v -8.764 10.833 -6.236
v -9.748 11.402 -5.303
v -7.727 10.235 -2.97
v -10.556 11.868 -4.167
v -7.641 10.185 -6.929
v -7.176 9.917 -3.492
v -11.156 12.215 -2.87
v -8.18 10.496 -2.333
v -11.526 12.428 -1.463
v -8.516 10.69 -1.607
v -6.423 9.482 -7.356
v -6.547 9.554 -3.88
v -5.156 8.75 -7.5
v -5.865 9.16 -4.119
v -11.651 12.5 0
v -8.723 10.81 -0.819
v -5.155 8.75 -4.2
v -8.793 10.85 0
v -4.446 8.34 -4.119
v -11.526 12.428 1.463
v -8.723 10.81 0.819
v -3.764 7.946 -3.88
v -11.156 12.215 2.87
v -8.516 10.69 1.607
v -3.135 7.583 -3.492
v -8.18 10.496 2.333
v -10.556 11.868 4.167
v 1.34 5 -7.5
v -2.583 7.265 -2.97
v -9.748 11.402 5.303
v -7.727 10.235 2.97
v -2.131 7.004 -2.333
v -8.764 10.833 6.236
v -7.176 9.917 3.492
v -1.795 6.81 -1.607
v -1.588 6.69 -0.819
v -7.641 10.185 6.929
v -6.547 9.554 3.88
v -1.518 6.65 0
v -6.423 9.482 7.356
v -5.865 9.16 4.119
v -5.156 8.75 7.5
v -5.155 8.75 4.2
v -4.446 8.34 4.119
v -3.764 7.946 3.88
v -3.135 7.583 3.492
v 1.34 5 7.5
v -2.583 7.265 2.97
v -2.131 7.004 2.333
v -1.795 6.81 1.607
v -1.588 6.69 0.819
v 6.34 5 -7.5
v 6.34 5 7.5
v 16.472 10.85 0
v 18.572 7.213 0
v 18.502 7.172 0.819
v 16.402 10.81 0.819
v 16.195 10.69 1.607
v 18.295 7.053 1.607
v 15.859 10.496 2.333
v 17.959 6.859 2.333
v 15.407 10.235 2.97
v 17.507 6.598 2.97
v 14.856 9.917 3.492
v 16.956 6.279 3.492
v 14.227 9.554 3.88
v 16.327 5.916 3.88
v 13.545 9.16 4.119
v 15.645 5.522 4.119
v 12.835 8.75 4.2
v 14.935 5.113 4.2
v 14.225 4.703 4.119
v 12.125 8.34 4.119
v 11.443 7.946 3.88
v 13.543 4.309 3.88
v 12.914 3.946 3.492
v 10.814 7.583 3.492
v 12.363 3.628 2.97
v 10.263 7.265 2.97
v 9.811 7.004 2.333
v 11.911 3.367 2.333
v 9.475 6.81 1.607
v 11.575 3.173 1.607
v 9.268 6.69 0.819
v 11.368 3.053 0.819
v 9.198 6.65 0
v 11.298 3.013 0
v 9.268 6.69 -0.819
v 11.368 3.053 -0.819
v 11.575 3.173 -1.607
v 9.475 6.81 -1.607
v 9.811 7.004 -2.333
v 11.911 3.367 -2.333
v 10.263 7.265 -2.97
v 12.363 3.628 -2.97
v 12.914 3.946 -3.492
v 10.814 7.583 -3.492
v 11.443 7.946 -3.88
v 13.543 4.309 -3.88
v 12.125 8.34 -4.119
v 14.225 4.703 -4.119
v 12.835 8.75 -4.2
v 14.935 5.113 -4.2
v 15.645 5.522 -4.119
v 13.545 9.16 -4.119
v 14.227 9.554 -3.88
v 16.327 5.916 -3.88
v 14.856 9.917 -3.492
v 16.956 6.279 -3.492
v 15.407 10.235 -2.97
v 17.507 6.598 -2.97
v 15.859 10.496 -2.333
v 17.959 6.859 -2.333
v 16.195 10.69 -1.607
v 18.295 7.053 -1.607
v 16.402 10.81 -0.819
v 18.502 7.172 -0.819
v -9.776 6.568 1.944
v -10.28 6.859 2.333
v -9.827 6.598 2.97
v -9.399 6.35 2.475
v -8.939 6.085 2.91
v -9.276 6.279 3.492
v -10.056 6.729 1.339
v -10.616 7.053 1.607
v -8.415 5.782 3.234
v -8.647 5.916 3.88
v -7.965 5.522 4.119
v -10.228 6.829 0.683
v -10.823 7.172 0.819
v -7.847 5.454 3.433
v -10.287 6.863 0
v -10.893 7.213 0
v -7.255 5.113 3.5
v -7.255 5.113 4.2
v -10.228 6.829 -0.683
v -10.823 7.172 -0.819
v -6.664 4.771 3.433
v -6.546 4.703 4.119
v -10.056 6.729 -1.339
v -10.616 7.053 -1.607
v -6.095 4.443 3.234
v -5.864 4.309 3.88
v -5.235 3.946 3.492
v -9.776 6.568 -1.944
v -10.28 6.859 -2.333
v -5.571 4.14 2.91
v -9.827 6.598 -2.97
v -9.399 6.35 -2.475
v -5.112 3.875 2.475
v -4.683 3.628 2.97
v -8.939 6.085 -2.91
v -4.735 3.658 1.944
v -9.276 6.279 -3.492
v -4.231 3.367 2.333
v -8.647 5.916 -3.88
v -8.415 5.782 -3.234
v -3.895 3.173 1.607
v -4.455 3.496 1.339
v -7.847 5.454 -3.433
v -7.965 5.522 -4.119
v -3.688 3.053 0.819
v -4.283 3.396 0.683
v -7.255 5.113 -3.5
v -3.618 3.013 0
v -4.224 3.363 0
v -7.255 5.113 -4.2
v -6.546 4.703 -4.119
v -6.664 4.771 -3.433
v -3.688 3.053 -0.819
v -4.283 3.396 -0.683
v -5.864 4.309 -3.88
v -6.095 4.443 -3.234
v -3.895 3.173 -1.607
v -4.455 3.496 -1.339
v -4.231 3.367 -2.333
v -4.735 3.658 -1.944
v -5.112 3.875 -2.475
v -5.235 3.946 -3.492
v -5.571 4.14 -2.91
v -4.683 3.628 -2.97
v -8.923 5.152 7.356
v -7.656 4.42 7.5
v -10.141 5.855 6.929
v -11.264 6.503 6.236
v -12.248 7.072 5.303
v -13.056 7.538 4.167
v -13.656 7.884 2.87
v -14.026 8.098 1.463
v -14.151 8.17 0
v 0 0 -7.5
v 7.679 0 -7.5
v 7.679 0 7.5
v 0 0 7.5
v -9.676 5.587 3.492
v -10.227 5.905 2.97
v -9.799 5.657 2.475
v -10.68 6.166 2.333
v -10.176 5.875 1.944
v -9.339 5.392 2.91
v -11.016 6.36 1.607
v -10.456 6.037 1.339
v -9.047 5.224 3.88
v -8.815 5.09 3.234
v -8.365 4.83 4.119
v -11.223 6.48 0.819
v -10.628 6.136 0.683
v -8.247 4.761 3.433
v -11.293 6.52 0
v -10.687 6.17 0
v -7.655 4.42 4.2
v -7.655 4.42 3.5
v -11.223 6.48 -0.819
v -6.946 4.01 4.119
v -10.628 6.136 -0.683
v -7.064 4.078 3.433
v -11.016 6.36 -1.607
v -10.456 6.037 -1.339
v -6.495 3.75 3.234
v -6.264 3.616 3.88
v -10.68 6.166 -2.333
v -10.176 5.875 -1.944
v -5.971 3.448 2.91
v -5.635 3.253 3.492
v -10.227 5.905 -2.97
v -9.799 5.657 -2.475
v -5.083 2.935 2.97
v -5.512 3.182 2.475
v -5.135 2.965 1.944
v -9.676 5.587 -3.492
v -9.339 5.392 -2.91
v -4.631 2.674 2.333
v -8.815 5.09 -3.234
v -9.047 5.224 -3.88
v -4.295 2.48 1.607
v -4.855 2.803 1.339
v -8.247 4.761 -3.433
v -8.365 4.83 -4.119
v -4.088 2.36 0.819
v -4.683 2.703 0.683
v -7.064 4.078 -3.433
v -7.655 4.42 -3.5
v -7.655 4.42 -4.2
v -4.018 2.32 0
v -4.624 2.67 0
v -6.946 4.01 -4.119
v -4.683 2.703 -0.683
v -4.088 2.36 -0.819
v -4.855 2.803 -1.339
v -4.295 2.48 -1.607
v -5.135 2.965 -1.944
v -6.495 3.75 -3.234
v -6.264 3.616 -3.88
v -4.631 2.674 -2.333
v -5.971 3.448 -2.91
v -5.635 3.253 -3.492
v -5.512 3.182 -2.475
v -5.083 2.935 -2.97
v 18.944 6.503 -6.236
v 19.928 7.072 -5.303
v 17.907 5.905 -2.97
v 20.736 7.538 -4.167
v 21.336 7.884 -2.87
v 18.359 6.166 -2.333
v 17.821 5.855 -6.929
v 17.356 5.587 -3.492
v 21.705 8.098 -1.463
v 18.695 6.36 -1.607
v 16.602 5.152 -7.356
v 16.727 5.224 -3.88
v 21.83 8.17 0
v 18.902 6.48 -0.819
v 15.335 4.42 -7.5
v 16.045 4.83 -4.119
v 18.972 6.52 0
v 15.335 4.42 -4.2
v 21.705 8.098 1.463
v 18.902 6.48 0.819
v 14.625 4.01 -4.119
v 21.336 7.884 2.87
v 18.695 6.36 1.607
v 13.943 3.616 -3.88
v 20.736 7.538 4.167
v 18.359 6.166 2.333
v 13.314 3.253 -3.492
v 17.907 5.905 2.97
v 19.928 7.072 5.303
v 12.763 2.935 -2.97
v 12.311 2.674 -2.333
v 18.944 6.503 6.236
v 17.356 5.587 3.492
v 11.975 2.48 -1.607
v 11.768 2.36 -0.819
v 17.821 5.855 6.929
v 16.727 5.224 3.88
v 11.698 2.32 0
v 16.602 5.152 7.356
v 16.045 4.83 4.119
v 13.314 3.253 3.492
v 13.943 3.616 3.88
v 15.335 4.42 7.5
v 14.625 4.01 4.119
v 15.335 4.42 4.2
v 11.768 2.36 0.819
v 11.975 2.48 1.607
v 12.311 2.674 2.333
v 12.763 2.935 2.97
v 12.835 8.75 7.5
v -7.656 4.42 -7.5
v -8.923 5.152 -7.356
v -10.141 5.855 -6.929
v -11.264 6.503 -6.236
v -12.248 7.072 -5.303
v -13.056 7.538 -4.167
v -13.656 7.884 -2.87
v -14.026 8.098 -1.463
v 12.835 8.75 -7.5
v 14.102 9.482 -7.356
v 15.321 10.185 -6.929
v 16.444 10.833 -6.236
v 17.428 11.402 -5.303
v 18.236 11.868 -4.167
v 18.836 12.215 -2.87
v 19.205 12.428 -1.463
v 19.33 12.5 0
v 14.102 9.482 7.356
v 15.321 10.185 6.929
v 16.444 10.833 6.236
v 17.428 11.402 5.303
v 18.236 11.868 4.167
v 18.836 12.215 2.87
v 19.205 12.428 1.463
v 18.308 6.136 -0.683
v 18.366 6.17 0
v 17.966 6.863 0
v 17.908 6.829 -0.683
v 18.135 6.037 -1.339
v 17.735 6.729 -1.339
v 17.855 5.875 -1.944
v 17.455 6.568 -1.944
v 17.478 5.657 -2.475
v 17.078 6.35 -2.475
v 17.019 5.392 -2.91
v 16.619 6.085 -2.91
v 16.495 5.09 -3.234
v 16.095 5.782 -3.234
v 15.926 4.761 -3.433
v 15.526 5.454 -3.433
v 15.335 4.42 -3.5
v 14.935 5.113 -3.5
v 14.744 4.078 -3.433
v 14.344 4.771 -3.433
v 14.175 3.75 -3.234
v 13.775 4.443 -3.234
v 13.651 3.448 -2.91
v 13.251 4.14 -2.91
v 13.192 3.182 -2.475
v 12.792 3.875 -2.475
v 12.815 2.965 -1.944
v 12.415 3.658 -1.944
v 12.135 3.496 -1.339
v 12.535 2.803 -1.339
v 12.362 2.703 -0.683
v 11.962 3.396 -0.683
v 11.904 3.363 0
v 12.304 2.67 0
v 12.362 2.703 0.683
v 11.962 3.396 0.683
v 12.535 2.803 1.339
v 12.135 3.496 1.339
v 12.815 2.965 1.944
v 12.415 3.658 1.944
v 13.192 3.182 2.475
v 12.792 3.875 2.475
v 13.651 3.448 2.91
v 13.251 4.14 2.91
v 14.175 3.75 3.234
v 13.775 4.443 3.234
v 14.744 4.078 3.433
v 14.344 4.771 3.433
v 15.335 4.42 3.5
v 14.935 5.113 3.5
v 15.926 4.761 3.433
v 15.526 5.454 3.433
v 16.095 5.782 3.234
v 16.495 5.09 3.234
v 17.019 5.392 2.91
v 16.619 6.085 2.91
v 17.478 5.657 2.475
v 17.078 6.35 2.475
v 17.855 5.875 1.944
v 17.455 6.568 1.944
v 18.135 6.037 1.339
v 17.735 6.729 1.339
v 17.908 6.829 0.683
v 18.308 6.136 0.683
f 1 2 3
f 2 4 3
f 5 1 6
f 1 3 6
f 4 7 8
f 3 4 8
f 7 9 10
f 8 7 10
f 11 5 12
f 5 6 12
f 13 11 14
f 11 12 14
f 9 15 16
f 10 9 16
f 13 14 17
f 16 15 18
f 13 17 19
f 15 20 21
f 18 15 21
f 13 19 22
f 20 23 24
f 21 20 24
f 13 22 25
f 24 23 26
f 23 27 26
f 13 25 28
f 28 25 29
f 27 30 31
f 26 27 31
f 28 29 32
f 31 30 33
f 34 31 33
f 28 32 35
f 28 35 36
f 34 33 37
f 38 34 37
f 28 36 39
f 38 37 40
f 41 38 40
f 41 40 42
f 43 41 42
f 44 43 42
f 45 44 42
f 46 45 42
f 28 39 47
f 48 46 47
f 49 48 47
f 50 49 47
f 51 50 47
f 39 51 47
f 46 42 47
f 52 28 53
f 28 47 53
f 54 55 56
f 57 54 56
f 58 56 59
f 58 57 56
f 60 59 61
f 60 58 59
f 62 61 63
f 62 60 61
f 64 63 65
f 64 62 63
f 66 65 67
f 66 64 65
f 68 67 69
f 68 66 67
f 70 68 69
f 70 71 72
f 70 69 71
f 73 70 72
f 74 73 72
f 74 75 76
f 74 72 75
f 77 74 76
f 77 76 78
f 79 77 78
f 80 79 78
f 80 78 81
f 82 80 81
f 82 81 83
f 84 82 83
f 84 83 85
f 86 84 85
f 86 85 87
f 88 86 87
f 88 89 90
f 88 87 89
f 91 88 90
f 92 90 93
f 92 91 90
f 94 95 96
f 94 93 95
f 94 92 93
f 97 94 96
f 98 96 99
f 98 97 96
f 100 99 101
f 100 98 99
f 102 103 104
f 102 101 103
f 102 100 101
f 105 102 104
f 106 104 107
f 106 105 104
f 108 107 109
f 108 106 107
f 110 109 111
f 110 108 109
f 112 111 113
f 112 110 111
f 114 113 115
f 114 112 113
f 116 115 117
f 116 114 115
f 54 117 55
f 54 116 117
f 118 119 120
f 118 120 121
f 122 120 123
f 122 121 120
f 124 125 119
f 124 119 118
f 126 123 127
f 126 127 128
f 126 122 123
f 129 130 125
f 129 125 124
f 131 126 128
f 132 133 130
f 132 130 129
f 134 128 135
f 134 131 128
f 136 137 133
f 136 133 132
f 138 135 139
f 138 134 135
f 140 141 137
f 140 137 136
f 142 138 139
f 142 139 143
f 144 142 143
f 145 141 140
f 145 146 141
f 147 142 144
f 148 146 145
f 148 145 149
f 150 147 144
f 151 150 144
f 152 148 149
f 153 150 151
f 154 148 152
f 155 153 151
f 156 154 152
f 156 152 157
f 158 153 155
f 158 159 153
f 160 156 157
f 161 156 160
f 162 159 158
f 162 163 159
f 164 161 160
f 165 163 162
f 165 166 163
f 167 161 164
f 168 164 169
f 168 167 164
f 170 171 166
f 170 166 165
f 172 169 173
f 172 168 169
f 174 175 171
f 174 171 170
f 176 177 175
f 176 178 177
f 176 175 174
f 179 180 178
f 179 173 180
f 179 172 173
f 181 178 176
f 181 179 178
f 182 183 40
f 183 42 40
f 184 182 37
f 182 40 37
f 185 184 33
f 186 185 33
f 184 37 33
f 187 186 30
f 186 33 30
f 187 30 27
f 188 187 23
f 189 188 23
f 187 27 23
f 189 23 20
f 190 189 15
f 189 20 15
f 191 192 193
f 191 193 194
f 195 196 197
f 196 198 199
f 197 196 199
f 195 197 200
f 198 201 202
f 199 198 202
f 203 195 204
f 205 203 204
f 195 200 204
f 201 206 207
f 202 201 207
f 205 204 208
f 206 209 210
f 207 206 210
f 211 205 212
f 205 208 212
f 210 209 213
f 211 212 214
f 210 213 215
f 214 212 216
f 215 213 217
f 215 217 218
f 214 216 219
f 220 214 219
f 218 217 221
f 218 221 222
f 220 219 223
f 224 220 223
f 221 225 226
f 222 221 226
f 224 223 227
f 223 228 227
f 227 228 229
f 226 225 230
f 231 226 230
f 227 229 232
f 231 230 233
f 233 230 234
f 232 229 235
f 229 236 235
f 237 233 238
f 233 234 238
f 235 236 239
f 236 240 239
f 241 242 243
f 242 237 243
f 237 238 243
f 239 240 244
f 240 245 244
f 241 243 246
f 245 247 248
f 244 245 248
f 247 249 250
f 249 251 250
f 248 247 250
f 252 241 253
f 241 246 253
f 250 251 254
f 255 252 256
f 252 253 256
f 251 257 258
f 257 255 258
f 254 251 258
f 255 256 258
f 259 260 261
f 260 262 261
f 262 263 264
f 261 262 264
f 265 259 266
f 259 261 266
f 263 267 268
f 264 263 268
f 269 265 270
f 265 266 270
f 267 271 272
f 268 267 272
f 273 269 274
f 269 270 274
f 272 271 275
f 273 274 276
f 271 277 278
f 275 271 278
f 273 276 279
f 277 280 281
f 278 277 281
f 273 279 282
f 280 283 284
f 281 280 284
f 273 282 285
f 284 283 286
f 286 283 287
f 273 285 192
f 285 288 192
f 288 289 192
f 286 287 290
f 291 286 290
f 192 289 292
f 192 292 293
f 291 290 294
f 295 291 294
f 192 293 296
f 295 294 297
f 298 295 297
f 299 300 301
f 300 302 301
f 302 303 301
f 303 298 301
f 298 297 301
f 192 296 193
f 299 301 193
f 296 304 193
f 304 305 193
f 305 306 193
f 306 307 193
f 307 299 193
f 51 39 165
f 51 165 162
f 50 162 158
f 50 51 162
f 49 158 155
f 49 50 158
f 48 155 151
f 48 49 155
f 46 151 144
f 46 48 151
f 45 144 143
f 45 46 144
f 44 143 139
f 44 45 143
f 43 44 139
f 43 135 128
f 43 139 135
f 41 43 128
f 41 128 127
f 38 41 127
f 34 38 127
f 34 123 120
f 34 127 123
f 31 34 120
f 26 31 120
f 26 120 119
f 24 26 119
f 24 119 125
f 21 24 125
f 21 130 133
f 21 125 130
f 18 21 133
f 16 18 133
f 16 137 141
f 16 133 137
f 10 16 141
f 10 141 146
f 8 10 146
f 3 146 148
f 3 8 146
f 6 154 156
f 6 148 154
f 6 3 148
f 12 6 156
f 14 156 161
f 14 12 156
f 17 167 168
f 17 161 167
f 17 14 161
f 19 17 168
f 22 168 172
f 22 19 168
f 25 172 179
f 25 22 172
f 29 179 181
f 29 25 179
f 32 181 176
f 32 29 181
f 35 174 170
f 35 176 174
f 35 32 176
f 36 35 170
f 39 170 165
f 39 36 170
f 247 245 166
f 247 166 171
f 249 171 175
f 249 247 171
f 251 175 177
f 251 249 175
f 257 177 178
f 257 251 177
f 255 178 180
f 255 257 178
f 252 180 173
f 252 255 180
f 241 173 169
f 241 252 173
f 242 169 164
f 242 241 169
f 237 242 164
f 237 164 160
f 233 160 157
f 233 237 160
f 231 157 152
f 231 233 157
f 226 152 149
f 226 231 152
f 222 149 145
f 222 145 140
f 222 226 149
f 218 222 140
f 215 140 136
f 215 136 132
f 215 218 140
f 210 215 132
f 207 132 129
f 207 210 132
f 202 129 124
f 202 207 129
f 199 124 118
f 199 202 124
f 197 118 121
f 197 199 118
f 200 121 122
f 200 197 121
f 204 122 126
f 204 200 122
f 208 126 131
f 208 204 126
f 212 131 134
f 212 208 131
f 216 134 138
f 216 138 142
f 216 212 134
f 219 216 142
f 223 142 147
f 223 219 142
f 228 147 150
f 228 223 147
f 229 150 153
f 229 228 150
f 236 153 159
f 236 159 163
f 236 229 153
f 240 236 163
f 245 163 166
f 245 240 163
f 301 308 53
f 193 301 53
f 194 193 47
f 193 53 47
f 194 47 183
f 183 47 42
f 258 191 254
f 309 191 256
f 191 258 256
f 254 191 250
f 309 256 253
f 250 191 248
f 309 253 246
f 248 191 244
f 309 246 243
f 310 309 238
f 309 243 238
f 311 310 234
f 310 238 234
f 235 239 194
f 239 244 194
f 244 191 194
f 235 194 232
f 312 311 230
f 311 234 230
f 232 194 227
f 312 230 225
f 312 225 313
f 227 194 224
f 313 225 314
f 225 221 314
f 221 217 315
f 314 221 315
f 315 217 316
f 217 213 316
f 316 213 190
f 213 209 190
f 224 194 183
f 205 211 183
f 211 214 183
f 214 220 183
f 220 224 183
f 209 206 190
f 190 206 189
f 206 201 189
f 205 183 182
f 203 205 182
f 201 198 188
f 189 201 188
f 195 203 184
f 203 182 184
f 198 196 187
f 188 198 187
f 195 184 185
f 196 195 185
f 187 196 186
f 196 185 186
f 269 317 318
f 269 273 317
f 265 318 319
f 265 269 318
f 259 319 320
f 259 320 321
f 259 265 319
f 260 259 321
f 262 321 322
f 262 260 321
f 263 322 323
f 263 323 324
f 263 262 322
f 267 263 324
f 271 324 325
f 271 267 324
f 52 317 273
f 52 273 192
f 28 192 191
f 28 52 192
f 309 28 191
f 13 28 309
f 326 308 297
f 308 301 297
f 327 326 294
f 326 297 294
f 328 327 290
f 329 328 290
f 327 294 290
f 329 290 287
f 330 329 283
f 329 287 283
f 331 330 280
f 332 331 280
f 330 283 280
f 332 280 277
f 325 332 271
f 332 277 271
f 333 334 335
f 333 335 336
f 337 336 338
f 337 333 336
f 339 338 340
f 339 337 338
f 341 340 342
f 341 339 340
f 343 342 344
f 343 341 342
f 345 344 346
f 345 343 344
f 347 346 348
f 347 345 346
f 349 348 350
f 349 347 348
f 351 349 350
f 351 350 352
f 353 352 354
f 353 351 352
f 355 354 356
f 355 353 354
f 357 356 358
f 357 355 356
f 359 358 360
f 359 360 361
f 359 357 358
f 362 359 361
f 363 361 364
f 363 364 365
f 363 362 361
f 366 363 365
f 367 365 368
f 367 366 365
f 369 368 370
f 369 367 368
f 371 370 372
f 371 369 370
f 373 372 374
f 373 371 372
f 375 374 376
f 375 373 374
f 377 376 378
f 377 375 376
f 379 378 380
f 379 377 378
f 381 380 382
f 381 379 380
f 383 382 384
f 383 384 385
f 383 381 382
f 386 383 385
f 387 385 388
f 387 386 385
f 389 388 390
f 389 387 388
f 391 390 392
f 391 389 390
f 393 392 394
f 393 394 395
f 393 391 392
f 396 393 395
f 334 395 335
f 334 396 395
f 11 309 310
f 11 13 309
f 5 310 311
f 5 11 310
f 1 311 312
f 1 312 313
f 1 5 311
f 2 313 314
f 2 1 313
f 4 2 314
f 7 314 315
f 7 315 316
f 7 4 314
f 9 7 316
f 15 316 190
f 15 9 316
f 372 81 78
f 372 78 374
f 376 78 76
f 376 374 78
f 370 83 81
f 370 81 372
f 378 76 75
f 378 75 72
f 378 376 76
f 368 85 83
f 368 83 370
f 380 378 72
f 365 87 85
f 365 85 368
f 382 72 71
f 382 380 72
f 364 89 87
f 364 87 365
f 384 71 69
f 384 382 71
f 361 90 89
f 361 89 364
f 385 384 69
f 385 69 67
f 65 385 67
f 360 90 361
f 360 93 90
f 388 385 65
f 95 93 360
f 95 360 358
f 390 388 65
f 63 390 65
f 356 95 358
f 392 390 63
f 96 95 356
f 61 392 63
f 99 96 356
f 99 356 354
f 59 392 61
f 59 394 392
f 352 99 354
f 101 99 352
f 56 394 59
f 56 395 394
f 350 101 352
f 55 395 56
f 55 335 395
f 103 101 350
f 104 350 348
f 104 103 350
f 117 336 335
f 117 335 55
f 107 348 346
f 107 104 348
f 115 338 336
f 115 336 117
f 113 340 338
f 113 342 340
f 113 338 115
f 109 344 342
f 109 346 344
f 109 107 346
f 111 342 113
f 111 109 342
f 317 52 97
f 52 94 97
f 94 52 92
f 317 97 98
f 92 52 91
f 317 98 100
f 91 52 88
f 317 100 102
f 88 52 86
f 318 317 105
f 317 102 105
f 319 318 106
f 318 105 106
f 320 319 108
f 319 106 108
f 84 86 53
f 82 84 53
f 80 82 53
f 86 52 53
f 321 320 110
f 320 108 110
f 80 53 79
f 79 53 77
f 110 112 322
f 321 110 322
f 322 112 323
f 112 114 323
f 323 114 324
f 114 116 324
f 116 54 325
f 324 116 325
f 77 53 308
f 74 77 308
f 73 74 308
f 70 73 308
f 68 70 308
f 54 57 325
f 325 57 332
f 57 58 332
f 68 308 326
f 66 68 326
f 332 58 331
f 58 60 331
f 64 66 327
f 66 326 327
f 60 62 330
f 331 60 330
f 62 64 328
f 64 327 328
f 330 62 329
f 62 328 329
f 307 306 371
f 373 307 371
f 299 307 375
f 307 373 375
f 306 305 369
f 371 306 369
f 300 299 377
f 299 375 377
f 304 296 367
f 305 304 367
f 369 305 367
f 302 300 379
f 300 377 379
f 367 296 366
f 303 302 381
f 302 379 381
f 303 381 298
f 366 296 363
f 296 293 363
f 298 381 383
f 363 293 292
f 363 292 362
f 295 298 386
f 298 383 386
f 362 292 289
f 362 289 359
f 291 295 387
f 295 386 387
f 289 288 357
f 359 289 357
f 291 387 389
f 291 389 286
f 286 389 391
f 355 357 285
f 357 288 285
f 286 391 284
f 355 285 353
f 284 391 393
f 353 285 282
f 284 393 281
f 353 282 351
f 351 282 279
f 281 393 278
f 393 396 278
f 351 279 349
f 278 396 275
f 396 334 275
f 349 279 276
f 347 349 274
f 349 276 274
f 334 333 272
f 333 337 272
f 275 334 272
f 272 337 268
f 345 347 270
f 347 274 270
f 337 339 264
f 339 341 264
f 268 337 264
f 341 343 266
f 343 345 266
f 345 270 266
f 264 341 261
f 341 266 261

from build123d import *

# Parameters (mm, degrees)
EXTRUDE_1_DEPTH          = 7.5
CUT_EXTRUDE_1_DEPTH      = 27.249846584
CUT_EXTRUDE_1_DEPTH_BACK = 27.249846584
SKETCH_2_R               = 4.2
CUT_EXTRUDE_2_DEPTH      = 27.516200545
CUT_EXTRUDE_2_DEPTH_BACK = 27.516200545
SKETCH_3_R               = 4.2
FILLET_1_R               = 7.5
SKETCH_4_R               = 4.2
SKETCH_4_R_2             = 3.5
EXTRUDE_2_DEPTH          = 0.8
SKETCH_5_R               = 4.2
SKETCH_5_R_2             = 3.5
EXTRUDE_3_DEPTH          = 0.8


with BuildPart() as part:
    # ｽｹｯﾁ1 → ﾎﾞｽ - 押し出し1 (new, symmetric)
    with BuildSketch(Plane.XY):
        Polygon((0, 0), (-14.150635095, 8.169872981), (-11.650635095, 12.5), (1.339745962, 5), (6.339745962, 5), (19.330127019, 12.5), (21.830127019, 8.169872981), (7.679491924, 0), align=None)
    extrude(amount=EXTRUDE_1_DEPTH, both=True)

    # ｽｹｯﾁ2 → ｶｯﾄ - 押し出し1 (cut, two sides: drawn at the far end of the back side and taken through both)
    with BuildSketch(Plane(origin=(0, 0, 0), x_dir=(0, 0, 1), z_dir=(-0.5000000000000012, -0.866025403784438, 0)).offset(-CUT_EXTRUDE_1_DEPTH_BACK)):
        with Locations(Location((0, 8.839745962, 0), (0, 0, 270))):
            Circle(SKETCH_2_R)
    extrude(amount=CUT_EXTRUDE_1_DEPTH + CUT_EXTRUDE_1_DEPTH_BACK, mode=Mode.SUBTRACT)

    # ｽｹｯﾁ3 → ｶｯﾄ - 押し出し2 (cut, two sides: drawn at the far end of the back side and taken through both)
    with BuildSketch(Plane(origin=(1.919872981, -3.325317547, 0), x_dir=(0, 0, -1), z_dir=(0.5000000000000013, -0.8660254037844379, 0)).offset(-CUT_EXTRUDE_2_DEPTH_BACK)):
        with Locations(Location((0, 15.490381057, 0), (0, 0, 90))):
            Circle(SKETCH_3_R)
    extrude(amount=CUT_EXTRUDE_2_DEPTH + CUT_EXTRUDE_2_DEPTH_BACK, mode=Mode.SUBTRACT)

    # ﾌｨﾚｯﾄ1
    fillet_1_edges = [part.edges().sort_by_distance(p)[0] for p in [
        (20.580127019, 10.334936491, -7.5),
        (20.580127019, 10.334936491, 7.5),
        (-12.900635095, 10.334936491, -7.5),
        (-12.900635095, 10.334936491, 7.5),
    ]]
    fillet(fillet_1_edges, radius=FILLET_1_R - 0.0001)  # a hair under: the kernel refuses the full size

    # ｽｹｯﾁ4 → ﾎﾞｽ - 押し出し2 (add)
    with BuildSketch(Plane(origin=(0, 0, 0), x_dir=(0.8660254037844382, -0.500000000000001, 0), z_dir=(0.5000000000000009, 0.866025403784438, 0))):
        with Locations((-8.839745962, 0)):
            Circle(SKETCH_4_R)
        with Locations((-8.839745962, 0)):
            Circle(SKETCH_4_R_2, mode=Mode.SUBTRACT)
    extrude(amount=EXTRUDE_2_DEPTH)

    # ｽｹｯﾁ5 → ﾎﾞｽ - 押し出し3 (add)
    with BuildSketch(Plane(origin=(1.919872981, -3.325317547, 0), x_dir=(0.8660254037844378, 0.5000000000000017, 0), z_dir=(-0.5000000000000016, 0.8660254037844377, 0))):
        with Locations((15.490381057, 0)):
            Circle(SKETCH_5_R)
        with Locations((15.490381057, 0)):
            Circle(SKETCH_5_R_2, mode=Mode.SUBTRACT)
    extrude(amount=EXTRUDE_3_DEPTH)


solid = part.part
